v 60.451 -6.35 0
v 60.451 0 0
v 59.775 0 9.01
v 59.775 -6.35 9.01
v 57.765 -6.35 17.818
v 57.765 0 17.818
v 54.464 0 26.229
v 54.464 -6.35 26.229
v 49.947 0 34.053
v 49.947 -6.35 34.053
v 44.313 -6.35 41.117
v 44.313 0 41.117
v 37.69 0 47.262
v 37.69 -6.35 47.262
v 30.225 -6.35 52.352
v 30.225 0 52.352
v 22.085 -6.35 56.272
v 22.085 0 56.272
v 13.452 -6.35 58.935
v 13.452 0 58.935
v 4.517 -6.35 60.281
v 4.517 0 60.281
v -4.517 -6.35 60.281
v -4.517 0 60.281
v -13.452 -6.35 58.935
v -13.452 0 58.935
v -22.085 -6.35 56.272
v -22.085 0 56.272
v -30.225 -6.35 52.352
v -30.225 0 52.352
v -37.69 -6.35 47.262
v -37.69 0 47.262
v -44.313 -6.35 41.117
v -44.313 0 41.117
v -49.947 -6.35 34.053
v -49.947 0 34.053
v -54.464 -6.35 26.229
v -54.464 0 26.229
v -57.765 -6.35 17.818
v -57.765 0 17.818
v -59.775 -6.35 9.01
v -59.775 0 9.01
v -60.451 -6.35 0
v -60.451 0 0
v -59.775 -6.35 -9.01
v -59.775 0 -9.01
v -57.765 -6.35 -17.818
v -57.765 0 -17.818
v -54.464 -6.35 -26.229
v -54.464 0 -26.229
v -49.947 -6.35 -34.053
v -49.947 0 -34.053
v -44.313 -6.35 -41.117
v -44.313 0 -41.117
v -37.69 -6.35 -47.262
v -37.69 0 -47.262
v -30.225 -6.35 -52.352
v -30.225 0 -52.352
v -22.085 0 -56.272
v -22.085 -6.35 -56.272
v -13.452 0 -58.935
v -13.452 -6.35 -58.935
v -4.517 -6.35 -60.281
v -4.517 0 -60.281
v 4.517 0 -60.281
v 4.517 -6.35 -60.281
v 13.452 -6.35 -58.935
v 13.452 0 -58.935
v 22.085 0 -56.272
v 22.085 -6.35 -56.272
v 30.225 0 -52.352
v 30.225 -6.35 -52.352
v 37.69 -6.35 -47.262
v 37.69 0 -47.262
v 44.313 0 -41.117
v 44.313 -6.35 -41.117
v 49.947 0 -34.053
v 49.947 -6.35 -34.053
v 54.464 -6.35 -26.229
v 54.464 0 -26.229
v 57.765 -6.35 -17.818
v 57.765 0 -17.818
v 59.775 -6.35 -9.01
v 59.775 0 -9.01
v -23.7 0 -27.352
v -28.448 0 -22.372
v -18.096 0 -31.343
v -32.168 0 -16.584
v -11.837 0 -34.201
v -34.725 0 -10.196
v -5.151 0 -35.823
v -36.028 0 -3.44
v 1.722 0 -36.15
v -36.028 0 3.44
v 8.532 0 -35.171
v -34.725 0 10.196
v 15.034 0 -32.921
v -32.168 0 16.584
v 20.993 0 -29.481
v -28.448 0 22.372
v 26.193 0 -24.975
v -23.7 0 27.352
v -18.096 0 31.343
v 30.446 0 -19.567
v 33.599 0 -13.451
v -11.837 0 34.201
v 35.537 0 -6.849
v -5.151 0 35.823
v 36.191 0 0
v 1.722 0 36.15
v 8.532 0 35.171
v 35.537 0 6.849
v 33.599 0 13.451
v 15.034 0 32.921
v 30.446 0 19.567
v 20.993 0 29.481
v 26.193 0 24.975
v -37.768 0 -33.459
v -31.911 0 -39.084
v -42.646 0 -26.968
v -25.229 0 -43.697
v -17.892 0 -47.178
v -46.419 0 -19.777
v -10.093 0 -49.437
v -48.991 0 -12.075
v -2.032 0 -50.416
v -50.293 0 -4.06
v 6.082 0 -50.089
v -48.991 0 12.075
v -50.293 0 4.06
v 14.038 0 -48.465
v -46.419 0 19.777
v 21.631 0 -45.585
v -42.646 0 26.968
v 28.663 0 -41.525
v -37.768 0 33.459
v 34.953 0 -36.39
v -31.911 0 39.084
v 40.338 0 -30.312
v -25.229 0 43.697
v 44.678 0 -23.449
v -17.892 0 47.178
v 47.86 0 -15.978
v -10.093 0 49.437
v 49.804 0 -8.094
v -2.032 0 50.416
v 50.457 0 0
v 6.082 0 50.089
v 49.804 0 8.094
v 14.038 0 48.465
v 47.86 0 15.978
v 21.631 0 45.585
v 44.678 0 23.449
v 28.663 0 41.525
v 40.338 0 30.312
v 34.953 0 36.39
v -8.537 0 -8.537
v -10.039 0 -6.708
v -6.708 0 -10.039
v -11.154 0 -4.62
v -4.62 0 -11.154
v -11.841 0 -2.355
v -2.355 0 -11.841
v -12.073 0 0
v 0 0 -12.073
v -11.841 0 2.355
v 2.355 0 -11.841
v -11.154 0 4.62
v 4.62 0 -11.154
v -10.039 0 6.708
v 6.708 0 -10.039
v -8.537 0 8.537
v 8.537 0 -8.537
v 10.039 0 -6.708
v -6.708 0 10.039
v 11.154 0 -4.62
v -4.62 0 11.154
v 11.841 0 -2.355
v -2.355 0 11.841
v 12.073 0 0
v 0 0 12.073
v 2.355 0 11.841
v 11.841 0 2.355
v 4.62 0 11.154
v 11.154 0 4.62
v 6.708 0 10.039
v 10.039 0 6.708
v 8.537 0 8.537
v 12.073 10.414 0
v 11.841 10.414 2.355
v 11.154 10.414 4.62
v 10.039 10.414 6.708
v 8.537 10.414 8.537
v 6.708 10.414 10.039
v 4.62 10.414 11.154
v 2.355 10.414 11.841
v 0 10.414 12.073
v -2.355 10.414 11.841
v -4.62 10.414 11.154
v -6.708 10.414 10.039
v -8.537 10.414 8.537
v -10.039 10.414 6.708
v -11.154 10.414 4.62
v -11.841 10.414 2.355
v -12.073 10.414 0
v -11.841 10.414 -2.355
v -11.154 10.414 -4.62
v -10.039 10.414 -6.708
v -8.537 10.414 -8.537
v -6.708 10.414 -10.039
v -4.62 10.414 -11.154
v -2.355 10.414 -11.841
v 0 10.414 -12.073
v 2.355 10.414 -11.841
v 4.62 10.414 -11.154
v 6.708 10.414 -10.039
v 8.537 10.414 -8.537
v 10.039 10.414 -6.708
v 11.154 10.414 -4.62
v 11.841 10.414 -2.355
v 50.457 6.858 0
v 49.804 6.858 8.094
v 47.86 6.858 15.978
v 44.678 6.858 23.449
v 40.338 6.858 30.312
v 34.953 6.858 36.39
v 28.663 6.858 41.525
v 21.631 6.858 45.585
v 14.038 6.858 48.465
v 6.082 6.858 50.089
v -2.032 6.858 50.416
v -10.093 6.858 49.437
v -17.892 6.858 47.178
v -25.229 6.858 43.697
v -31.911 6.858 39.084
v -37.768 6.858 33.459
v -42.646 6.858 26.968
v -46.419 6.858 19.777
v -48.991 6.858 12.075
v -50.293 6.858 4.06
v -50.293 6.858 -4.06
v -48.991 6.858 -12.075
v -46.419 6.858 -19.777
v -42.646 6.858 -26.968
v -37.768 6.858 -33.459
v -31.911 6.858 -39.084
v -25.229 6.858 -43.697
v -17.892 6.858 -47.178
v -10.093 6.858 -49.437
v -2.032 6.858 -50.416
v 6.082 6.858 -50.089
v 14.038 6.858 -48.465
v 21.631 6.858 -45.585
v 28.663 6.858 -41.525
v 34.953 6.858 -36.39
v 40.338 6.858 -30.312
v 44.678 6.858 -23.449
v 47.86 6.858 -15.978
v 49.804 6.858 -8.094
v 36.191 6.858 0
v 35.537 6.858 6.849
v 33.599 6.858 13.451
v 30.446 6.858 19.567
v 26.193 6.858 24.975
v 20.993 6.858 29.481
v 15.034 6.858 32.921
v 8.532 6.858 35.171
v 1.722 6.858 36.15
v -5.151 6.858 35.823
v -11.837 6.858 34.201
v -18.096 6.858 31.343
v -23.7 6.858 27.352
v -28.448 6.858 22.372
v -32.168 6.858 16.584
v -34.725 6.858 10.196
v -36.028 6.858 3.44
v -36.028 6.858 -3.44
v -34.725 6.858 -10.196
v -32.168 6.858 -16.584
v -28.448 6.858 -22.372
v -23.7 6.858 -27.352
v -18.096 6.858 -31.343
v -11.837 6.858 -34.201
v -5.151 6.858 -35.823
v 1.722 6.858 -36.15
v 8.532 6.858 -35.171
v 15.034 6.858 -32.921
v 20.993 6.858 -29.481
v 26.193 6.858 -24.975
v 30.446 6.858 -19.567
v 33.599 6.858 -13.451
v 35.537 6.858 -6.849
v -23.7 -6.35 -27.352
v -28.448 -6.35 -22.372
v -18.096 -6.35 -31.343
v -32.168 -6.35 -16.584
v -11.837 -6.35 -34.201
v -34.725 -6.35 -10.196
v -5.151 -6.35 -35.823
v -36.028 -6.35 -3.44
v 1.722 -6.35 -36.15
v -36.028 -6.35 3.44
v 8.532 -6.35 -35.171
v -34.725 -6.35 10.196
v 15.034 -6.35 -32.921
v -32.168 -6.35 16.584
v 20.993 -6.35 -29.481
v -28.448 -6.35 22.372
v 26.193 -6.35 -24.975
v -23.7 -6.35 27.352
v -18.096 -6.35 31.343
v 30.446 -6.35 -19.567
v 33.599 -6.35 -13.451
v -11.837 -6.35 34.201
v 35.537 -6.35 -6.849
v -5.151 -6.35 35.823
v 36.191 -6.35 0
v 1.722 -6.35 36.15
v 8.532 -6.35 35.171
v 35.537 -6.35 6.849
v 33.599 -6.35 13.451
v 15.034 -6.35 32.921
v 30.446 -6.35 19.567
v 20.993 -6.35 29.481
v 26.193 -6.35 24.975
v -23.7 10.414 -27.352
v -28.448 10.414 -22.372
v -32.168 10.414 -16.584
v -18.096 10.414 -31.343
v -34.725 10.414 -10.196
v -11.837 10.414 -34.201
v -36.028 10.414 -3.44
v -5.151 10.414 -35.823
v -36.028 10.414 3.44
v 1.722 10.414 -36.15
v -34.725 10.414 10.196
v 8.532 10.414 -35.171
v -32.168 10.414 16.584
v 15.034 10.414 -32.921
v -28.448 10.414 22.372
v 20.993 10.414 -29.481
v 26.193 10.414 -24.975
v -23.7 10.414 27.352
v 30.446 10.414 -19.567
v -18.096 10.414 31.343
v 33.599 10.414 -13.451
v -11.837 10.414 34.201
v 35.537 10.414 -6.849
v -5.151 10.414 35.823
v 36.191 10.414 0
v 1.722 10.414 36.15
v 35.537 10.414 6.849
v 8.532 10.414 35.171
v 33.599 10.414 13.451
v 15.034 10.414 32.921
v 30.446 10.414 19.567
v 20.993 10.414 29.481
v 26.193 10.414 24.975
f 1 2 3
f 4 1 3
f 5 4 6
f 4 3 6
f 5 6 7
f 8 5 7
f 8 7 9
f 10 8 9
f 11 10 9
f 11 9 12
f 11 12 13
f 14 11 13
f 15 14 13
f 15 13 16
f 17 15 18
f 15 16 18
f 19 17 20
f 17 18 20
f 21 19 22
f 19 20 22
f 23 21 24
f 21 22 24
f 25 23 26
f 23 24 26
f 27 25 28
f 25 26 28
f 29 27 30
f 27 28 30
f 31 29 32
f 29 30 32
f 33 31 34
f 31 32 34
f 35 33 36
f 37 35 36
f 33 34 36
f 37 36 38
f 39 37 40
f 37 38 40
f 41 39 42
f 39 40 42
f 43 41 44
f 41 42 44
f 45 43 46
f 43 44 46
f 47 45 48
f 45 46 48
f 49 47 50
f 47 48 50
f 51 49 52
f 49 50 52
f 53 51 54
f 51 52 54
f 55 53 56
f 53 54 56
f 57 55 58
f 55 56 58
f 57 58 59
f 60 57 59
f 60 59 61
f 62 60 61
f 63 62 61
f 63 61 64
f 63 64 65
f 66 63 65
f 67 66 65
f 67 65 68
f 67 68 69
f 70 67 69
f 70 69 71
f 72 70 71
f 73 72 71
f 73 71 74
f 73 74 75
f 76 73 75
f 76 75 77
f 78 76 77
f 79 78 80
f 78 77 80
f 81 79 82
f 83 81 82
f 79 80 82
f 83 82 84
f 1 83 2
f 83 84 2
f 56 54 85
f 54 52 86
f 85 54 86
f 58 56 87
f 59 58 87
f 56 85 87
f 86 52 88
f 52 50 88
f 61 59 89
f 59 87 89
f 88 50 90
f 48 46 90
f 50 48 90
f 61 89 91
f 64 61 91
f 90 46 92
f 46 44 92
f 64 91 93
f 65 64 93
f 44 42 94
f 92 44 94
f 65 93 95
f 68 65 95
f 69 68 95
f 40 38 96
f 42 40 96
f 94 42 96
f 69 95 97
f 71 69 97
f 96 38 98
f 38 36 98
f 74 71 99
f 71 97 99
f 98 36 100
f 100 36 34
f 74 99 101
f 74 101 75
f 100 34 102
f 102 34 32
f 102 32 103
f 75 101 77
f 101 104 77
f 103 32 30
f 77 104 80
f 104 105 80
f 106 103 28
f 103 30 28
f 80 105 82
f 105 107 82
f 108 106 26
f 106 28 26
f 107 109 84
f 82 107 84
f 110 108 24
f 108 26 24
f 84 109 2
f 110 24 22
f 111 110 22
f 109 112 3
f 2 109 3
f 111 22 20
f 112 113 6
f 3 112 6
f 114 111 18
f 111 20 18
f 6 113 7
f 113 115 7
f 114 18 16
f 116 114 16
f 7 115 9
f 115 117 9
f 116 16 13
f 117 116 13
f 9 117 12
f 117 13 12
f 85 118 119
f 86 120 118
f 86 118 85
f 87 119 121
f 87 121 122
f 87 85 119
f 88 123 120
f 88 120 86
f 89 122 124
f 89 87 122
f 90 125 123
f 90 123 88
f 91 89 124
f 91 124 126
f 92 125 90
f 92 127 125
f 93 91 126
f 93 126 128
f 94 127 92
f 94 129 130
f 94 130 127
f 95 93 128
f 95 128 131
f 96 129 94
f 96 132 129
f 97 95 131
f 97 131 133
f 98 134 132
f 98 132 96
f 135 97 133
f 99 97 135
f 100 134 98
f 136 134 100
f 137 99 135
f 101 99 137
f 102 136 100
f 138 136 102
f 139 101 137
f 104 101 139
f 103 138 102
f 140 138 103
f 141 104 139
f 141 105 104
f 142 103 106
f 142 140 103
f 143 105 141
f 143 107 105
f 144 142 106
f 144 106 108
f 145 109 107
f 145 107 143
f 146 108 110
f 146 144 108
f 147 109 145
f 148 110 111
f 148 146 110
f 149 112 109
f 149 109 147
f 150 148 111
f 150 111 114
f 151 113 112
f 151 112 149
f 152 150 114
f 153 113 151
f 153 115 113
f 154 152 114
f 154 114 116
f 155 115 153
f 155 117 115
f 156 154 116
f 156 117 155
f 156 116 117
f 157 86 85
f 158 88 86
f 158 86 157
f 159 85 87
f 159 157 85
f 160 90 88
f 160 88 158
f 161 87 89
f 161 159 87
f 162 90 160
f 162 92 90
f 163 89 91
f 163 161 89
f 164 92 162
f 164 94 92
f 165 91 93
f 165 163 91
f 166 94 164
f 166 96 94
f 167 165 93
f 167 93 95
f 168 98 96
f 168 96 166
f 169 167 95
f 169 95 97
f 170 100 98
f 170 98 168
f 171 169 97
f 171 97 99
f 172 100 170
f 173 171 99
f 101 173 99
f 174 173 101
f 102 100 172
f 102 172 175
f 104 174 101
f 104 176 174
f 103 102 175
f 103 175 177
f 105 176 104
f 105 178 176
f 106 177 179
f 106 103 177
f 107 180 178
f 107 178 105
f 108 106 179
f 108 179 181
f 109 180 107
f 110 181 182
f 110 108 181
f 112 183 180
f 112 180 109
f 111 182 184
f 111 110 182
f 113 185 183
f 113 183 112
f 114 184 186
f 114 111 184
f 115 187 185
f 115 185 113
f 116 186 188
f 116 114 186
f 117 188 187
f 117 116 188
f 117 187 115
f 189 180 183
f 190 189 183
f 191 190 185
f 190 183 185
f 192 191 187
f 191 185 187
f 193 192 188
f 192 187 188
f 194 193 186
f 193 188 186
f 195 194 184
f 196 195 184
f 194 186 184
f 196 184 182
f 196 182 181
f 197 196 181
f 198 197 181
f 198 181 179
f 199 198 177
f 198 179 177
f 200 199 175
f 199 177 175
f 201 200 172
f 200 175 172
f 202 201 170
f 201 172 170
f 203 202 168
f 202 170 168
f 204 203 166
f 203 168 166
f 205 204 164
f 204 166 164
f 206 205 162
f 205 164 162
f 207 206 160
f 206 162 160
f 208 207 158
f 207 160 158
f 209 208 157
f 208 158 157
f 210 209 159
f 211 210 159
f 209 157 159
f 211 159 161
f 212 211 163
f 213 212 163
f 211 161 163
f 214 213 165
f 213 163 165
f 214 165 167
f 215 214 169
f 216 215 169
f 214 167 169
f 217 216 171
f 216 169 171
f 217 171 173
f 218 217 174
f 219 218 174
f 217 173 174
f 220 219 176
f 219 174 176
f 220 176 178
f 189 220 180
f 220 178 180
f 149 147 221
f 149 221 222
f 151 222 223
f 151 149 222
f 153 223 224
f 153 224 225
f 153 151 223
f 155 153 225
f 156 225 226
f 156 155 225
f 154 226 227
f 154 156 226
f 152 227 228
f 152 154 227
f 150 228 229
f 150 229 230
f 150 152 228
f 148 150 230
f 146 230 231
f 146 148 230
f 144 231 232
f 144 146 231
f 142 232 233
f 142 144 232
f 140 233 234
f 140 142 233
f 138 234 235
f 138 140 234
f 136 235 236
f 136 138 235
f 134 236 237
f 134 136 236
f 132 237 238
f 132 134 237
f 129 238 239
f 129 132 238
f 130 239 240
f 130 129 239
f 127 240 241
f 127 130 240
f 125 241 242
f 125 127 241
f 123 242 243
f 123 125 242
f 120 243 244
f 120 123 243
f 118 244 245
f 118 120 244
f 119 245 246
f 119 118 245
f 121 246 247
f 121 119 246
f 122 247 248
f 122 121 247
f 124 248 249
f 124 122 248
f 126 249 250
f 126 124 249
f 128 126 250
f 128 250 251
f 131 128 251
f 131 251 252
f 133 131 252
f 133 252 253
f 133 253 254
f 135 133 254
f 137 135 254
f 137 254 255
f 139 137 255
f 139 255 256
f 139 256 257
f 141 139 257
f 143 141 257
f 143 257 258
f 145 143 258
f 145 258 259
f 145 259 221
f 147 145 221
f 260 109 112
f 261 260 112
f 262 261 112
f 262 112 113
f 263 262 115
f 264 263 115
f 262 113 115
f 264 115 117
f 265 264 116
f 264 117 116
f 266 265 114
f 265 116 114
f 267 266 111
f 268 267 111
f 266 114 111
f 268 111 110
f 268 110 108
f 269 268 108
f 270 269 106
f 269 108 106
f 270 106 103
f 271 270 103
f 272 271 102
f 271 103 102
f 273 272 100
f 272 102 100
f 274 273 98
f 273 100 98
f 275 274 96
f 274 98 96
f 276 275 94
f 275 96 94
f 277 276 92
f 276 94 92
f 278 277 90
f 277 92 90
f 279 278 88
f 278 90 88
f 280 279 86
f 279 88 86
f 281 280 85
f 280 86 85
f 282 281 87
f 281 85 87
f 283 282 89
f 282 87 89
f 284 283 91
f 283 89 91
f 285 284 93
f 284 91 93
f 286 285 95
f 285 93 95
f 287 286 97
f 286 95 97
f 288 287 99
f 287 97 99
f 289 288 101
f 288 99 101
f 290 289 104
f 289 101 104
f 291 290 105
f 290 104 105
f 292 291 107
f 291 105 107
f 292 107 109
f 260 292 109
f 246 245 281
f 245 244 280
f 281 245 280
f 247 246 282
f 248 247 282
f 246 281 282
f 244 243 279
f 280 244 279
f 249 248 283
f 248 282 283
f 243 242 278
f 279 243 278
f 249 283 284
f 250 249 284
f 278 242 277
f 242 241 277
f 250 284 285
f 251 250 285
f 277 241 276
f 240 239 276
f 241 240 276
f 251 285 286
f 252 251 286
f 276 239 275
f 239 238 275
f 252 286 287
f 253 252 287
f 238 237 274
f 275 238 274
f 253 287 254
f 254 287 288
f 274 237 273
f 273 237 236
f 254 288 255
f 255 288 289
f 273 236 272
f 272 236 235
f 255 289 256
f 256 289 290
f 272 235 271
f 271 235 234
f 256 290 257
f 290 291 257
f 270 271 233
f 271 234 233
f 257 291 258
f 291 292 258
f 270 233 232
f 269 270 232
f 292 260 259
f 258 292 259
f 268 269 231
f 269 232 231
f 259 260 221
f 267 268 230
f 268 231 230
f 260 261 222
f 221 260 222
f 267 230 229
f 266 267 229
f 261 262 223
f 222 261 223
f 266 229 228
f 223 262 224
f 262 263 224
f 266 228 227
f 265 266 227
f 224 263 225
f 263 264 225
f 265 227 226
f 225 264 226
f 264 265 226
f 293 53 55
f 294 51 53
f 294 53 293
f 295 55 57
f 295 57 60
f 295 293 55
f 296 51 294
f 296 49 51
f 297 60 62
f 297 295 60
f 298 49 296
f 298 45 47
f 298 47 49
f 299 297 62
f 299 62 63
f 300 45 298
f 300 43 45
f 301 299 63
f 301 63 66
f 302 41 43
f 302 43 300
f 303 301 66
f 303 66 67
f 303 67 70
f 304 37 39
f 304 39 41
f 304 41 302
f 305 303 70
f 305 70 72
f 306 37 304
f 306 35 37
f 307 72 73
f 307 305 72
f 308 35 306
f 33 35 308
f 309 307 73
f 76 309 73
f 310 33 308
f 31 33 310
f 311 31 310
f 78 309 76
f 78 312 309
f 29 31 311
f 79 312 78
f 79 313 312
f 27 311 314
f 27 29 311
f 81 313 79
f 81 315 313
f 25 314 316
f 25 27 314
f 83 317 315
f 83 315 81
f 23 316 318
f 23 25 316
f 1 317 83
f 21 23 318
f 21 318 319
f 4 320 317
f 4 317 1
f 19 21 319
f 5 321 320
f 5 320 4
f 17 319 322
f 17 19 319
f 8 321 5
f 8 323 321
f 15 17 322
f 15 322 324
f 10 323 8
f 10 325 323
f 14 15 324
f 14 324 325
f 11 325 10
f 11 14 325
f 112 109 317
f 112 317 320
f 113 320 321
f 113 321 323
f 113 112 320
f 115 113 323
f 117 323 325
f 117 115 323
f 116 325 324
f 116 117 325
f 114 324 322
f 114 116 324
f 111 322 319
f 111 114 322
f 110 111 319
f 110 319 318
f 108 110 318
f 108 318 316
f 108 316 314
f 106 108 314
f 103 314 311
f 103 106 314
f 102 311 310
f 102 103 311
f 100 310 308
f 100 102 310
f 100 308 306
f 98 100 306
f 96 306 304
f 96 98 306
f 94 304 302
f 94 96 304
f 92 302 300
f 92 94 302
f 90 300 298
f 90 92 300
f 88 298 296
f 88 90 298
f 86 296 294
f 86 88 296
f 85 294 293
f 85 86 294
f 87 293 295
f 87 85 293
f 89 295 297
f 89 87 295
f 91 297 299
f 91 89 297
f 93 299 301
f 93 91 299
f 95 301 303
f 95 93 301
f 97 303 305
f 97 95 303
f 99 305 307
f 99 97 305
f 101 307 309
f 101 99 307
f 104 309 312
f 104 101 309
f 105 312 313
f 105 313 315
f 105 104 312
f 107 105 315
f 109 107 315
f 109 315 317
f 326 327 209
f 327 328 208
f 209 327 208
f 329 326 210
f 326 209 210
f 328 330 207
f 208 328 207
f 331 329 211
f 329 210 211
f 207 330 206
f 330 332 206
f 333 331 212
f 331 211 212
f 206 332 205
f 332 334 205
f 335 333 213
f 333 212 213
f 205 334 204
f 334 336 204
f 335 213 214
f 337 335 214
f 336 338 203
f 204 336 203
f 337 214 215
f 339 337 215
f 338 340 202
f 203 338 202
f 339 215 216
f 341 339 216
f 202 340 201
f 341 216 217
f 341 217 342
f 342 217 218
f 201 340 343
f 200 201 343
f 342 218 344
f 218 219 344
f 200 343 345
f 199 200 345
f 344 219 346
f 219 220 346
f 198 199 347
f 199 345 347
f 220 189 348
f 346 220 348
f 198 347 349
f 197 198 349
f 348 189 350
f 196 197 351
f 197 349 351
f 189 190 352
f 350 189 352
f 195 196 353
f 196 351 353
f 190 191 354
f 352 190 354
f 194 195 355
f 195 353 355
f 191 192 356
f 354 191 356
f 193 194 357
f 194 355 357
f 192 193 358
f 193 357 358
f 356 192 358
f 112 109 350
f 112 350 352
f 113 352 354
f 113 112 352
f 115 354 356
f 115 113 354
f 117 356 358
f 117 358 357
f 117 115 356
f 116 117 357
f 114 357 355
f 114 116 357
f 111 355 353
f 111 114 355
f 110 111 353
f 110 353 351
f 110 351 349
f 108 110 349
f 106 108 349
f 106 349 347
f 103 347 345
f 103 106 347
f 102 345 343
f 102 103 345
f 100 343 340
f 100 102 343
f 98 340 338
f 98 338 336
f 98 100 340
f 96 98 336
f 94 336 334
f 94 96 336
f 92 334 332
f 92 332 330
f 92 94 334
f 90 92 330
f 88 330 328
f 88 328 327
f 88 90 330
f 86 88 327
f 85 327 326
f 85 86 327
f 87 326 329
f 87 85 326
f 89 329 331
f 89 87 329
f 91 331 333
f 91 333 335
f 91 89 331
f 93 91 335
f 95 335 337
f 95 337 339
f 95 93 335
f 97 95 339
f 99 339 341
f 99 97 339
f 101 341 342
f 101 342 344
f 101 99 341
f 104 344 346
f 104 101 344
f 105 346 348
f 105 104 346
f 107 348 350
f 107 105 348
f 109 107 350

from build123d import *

# Parameters (mm, degrees)
F0_R     = 36.191422
F0_R_2   = 12.073269
F1_DEPTH = 10.414
F0_R_3   = 60.450528
F2_DEPTH = 6.35
F3_R     = 50.4571
F3_R_2   = 36.191422
F4_DEPTH = 6.858


with BuildPart() as f1:
    # F0 (on Front) → F1 (new body)
    with BuildSketch(Plane.XZ):
        Circle(F0_R)
        Circle(F0_R_2, mode=Mode.SUBTRACT)
    extrude(amount=-F1_DEPTH)


with BuildPart() as f2:
    # F0 (on Front) → F2 (new body)
    with BuildSketch(Plane.XZ):
        Circle(F0_R_3)
        Circle(F0_R, mode=Mode.SUBTRACT)
    extrude(amount=F2_DEPTH)


with BuildPart() as f4:
    # F3 (on face) → F4 (new body)
    with BuildSketch(Plane.XZ):
        Circle(F3_R)
        Circle(F3_R_2, mode=Mode.SUBTRACT)
    extrude(amount=-F4_DEPTH)


solid = Compound([f1.part, f2.part, f4.part])
